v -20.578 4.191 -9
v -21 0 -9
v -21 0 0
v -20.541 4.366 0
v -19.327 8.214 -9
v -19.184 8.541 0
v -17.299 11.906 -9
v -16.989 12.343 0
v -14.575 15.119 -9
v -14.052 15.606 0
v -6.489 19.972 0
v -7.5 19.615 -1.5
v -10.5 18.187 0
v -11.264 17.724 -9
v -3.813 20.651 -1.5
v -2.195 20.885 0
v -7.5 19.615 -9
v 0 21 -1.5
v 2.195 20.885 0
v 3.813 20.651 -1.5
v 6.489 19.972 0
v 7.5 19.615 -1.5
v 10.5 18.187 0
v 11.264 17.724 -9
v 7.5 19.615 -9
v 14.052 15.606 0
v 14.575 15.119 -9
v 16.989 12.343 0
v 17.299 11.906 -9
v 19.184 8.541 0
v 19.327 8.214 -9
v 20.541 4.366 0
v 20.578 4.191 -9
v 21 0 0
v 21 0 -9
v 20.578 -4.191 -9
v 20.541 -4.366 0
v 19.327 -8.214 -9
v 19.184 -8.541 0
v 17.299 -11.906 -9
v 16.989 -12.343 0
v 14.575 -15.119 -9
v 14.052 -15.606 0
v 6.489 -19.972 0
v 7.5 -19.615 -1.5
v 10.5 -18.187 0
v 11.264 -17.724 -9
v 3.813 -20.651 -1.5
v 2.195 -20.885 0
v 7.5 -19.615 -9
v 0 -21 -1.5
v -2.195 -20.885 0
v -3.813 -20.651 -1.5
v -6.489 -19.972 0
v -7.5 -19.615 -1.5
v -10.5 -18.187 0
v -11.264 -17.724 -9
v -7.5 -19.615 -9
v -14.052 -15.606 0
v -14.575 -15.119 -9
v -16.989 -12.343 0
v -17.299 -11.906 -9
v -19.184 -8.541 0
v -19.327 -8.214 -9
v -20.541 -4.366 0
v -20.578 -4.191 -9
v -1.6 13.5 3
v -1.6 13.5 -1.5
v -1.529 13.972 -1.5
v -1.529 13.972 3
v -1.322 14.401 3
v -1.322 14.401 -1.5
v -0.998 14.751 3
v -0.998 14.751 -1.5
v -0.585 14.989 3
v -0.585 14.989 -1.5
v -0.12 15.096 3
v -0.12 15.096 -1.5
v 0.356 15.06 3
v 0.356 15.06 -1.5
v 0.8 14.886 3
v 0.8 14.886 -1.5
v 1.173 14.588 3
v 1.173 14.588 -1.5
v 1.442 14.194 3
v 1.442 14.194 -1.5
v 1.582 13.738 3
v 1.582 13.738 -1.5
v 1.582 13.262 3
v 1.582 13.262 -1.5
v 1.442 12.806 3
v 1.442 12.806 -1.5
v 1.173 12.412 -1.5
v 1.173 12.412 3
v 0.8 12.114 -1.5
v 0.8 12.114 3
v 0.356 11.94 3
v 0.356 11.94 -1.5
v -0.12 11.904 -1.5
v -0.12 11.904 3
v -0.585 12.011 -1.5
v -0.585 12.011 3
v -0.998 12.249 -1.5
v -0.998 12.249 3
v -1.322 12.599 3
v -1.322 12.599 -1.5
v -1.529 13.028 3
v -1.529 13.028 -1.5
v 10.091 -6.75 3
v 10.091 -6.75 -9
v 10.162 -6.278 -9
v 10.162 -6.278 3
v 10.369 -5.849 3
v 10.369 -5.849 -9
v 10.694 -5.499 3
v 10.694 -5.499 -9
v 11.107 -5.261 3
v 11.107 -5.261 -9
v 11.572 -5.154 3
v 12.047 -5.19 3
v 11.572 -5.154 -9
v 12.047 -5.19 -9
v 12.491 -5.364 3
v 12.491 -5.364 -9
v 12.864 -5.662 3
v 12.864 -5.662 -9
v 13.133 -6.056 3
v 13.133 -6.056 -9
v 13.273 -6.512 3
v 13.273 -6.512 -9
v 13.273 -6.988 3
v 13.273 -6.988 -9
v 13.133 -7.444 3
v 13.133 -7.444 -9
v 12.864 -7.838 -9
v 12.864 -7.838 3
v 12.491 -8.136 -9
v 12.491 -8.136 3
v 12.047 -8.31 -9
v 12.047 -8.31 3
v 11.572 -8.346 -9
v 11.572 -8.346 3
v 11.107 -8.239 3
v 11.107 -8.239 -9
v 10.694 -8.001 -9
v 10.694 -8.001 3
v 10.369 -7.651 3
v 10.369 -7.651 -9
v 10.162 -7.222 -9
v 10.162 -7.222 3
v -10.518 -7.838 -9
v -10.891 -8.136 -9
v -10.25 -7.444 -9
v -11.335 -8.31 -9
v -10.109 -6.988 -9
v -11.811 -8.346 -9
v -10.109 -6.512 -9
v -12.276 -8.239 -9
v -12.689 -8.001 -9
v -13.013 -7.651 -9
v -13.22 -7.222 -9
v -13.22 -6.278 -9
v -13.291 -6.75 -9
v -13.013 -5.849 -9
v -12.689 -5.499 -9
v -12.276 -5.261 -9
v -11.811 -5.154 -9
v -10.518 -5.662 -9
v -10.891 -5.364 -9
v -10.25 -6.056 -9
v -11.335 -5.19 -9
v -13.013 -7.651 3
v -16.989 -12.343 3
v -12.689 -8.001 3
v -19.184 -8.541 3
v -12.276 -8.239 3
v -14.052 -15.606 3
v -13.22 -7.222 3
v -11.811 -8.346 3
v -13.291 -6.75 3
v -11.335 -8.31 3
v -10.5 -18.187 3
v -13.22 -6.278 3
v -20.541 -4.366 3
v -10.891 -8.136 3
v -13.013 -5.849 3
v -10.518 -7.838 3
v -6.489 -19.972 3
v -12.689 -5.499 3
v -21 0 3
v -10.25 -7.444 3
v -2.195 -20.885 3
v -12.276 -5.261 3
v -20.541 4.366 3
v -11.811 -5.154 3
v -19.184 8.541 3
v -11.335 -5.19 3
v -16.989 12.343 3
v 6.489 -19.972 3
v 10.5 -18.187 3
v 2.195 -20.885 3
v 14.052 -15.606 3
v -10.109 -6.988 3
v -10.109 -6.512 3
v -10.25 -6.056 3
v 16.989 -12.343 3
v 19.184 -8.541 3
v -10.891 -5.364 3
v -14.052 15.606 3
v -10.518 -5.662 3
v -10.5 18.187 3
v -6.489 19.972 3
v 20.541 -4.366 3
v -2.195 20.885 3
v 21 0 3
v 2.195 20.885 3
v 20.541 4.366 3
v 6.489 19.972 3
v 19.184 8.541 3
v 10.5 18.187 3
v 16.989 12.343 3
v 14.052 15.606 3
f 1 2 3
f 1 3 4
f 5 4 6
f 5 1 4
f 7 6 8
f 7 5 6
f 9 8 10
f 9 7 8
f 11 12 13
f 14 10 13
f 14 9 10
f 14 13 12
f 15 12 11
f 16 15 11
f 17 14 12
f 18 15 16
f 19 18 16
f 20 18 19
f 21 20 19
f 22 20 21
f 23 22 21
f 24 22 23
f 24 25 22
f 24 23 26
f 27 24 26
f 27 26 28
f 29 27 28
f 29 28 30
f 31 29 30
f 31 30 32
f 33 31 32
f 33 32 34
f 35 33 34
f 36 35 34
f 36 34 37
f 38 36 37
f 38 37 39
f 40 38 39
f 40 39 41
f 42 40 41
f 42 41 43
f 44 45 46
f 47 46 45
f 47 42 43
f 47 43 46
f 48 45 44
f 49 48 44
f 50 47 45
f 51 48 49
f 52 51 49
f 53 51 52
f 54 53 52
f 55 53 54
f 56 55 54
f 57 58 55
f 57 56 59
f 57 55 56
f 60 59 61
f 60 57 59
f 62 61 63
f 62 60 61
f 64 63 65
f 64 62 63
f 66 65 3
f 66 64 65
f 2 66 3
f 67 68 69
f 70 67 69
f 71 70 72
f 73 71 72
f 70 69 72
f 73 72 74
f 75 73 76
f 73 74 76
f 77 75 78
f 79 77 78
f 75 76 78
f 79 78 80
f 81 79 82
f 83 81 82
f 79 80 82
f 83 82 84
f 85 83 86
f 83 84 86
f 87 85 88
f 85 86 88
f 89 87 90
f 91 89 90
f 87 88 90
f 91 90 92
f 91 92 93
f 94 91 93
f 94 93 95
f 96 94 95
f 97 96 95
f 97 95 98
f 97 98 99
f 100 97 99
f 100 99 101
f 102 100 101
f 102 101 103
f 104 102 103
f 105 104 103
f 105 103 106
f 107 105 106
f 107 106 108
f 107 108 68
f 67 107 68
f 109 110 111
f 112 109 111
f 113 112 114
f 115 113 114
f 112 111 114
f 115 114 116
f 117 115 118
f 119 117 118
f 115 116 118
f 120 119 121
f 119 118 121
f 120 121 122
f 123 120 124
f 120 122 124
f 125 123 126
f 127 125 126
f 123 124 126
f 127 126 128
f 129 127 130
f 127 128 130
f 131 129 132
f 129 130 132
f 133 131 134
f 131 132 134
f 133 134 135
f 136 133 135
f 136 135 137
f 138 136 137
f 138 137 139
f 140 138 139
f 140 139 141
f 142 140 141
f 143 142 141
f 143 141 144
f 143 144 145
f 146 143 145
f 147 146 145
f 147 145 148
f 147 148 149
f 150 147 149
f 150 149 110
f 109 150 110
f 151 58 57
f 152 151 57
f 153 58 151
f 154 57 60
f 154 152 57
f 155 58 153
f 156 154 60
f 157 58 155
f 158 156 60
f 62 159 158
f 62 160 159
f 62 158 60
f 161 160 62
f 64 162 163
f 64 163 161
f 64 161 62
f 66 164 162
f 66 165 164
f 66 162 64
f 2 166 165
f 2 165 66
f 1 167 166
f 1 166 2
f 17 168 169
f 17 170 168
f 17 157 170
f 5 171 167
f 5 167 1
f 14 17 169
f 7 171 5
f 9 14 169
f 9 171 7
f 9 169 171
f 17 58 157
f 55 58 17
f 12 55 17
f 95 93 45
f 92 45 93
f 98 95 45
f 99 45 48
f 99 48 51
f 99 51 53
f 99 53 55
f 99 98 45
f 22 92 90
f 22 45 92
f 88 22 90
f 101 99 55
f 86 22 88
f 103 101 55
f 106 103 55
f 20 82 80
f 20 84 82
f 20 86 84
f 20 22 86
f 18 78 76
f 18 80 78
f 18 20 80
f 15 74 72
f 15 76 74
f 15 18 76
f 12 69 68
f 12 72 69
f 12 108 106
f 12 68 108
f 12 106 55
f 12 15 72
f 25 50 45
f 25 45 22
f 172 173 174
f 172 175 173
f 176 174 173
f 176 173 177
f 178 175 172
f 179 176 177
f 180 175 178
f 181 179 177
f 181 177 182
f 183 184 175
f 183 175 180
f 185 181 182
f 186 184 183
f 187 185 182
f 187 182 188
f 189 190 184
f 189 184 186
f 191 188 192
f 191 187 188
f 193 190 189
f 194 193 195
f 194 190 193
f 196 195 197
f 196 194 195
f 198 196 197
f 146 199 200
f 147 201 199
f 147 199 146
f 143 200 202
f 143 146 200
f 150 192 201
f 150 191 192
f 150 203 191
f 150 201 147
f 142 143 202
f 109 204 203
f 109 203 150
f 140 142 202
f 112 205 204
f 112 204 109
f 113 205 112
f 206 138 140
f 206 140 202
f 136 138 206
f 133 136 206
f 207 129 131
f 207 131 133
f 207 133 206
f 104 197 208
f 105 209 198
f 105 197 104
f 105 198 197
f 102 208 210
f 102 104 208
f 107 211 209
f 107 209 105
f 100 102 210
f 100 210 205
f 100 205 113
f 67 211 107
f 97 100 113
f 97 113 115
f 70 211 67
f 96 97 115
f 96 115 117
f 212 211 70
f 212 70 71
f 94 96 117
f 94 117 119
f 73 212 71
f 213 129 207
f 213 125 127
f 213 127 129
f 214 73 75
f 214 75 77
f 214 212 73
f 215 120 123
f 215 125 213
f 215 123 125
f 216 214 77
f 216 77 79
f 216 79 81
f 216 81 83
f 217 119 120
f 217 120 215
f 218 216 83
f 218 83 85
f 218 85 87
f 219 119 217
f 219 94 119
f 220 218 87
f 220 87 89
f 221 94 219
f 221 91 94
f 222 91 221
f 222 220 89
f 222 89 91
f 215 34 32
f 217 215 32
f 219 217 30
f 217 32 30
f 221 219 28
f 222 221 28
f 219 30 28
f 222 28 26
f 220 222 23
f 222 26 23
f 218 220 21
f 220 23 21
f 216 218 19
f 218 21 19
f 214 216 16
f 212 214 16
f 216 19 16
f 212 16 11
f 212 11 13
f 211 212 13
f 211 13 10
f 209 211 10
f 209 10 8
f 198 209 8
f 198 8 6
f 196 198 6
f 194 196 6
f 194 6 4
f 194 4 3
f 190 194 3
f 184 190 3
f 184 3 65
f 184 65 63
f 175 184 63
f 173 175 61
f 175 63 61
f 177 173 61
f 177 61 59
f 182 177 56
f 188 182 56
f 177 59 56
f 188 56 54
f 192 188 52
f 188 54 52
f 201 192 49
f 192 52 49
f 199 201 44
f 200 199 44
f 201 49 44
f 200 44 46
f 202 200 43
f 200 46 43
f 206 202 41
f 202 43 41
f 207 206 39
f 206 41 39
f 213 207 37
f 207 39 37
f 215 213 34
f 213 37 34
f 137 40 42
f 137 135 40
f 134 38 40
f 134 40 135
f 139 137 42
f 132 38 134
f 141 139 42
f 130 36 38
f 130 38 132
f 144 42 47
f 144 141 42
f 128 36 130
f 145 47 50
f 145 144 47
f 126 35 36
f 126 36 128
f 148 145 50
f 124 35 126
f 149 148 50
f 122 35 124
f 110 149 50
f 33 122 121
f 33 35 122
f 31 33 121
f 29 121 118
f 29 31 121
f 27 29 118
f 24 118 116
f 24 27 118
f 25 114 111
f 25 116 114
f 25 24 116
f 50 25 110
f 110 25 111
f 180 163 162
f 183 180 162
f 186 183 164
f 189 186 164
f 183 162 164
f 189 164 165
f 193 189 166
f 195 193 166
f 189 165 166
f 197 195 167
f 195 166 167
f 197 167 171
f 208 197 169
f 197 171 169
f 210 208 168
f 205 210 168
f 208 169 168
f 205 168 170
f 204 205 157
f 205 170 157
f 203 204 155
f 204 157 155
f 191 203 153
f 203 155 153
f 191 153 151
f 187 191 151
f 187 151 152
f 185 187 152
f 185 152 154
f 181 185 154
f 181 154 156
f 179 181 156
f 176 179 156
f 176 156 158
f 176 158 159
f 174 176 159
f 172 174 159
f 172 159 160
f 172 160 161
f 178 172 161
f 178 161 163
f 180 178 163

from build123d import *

# Parameters (mm, degrees)
SKETCH_1_R          = 21
EXTRUDE_1_DEPTH     = 3
EXTRUDE_START       = 9
SKETCH_2_R          = 21
EXTRUDE_2_DEPTH     = 9
SKETCH_3_R          = 1.6
CUT_EXTRUDE_1_DEPTH = 26.5
SKETCH_6_W          = 15
SKETCH_6_H          = 50
CUT_EXTRUDE_3_DEPTH = 7.5


with BuildPart() as part:
    # 草图1 → 凸台-拉伸1 (new body)
    with BuildSketch(Plane.XY):
        Circle(SKETCH_1_R)
    extrude(amount=EXTRUDE_1_DEPTH)

    # 草图2 → 凸台-拉伸2 (add)
    with BuildSketch(Plane(origin=(0, 0, 0), x_dir=(-1, 0, 0), z_dir=(0, 0, -1)).offset(EXTRUDE_START)):
        Circle(SKETCH_2_R)
    extrude(amount=-EXTRUDE_2_DEPTH)

    # 草图3 → 切除-拉伸1 (cut)
    with BuildSketch(Plane(origin=(0, 0, -9), x_dir=(-1, 0, 0), z_dir=(0, 0, -1))):
        with Locations((0, 13.5)):
            Circle(SKETCH_3_R)
        with Locations((11.691342951, -6.75)):
            Circle(SKETCH_3_R)
        with Locations((-11.691342951, -6.75)):
            Circle(SKETCH_3_R)
    extrude(amount=-CUT_EXTRUDE_1_DEPTH, mode=Mode.SUBTRACT)

    # 草图6 → 切除-拉伸3 (cut)
    with BuildSketch(Plane(origin=(0, 0, -9), x_dir=(-1, 0, 0), z_dir=(0, 0, -1))):
        Rectangle(SKETCH_6_W, SKETCH_6_H)
    extrude(amount=-CUT_EXTRUDE_3_DEPTH, mode=Mode.SUBTRACT)


solid = part.part
